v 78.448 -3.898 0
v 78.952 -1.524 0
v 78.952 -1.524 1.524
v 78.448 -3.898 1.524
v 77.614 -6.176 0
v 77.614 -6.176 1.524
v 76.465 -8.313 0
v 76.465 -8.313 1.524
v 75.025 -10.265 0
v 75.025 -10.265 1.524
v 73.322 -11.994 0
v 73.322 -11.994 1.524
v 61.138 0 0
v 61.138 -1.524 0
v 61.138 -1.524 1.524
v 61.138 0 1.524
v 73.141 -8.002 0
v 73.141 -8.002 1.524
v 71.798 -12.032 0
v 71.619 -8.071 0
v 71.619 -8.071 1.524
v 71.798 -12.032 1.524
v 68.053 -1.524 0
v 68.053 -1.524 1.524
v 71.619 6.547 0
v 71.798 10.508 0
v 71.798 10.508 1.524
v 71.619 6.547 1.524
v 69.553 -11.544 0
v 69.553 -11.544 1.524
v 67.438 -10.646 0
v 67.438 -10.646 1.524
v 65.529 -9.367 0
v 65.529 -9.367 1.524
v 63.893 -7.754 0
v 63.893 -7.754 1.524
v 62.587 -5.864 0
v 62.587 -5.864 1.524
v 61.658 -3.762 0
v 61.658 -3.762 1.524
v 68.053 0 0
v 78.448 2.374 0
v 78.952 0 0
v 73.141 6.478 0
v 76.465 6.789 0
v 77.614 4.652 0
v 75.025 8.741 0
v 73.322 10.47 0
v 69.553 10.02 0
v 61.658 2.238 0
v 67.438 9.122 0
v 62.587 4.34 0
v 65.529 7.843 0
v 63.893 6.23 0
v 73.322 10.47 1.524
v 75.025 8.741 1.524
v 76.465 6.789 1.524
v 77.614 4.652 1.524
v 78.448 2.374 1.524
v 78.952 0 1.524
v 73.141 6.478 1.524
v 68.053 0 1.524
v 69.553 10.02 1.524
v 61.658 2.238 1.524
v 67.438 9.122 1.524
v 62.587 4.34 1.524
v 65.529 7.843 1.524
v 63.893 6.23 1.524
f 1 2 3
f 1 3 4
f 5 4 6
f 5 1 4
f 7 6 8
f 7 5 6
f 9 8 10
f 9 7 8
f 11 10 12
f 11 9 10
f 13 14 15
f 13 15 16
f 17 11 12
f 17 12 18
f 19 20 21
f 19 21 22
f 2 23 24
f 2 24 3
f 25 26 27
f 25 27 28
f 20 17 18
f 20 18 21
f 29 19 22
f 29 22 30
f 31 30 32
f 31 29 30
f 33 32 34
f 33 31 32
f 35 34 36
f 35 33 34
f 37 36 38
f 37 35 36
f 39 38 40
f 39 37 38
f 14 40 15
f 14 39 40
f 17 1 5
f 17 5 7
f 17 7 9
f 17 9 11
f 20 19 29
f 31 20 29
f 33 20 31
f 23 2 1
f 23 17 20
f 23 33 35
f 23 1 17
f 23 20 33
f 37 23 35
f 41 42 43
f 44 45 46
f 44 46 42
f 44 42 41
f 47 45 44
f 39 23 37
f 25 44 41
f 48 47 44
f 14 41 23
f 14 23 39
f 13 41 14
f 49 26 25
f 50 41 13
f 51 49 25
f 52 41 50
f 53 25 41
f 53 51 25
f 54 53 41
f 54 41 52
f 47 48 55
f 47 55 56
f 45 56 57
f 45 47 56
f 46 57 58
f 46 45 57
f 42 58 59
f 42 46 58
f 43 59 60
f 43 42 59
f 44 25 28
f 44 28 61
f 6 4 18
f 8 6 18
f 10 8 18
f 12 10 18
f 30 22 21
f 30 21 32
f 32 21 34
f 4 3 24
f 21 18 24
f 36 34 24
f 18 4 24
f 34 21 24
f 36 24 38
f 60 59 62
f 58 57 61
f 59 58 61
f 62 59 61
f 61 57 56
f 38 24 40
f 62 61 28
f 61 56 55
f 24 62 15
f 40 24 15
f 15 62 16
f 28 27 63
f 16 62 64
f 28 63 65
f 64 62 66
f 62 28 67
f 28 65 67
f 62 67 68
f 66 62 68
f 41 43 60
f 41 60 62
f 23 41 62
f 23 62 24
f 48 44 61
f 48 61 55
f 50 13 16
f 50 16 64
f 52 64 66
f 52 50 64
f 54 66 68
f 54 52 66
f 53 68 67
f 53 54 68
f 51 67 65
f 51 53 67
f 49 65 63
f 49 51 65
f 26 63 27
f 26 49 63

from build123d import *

# Parameters (mm, degrees)
BOSS_EXTRUDE1_DEPTH = 1.524


with BuildPart() as part:
    # Sketch1 → Boss-Extrude1 (new body)
    with BuildSketch(Plane.XY):
        with BuildLine():
            Line((68.053425724, 0), (68.053425724, -1.524))
            Line((68.053425724, -1.524), (78.95165892, -1.524))
            ThreePointArc((78.95165892, -1.524), (77.077407117, -7.264754764), (73.322018867, -11.994040562))
            Line((73.322018867, -11.994040562), (73.141160104, -8.002049555))
            Line((73.141160104, -8.002049555), (71.618721766, -8.071024238))
            Line((71.618721766, -8.071024238), (71.798167573, -12.031827879))
            ThreePointArc((71.798167573, -12.031827879), (64.673060187, -8.599062053), (61.138299457, -1.524))
            Line((61.138299457, -1.524), (61.138299457, 0))
            ThreePointArc((61.138299457, 0), (64.673060187, 7.075062053), (71.798167573, 10.507827879))
            Line((71.798167573, 10.507827879), (71.618721766, 6.547024238))
            Line((71.618721766, 6.547024238), (73.141160104, 6.478049555))
            Line((73.141160104, 6.478049555), (73.322018867, 10.470040562))
            ThreePointArc((73.322018867, 10.470040562), (77.077407117, 5.740754764), (78.95165892, 0))
            Line((78.95165892, 0), (68.053425724, 0))
        make_face()
    extrude(amount=BOSS_EXTRUDE1_DEPTH)


solid = part.part
